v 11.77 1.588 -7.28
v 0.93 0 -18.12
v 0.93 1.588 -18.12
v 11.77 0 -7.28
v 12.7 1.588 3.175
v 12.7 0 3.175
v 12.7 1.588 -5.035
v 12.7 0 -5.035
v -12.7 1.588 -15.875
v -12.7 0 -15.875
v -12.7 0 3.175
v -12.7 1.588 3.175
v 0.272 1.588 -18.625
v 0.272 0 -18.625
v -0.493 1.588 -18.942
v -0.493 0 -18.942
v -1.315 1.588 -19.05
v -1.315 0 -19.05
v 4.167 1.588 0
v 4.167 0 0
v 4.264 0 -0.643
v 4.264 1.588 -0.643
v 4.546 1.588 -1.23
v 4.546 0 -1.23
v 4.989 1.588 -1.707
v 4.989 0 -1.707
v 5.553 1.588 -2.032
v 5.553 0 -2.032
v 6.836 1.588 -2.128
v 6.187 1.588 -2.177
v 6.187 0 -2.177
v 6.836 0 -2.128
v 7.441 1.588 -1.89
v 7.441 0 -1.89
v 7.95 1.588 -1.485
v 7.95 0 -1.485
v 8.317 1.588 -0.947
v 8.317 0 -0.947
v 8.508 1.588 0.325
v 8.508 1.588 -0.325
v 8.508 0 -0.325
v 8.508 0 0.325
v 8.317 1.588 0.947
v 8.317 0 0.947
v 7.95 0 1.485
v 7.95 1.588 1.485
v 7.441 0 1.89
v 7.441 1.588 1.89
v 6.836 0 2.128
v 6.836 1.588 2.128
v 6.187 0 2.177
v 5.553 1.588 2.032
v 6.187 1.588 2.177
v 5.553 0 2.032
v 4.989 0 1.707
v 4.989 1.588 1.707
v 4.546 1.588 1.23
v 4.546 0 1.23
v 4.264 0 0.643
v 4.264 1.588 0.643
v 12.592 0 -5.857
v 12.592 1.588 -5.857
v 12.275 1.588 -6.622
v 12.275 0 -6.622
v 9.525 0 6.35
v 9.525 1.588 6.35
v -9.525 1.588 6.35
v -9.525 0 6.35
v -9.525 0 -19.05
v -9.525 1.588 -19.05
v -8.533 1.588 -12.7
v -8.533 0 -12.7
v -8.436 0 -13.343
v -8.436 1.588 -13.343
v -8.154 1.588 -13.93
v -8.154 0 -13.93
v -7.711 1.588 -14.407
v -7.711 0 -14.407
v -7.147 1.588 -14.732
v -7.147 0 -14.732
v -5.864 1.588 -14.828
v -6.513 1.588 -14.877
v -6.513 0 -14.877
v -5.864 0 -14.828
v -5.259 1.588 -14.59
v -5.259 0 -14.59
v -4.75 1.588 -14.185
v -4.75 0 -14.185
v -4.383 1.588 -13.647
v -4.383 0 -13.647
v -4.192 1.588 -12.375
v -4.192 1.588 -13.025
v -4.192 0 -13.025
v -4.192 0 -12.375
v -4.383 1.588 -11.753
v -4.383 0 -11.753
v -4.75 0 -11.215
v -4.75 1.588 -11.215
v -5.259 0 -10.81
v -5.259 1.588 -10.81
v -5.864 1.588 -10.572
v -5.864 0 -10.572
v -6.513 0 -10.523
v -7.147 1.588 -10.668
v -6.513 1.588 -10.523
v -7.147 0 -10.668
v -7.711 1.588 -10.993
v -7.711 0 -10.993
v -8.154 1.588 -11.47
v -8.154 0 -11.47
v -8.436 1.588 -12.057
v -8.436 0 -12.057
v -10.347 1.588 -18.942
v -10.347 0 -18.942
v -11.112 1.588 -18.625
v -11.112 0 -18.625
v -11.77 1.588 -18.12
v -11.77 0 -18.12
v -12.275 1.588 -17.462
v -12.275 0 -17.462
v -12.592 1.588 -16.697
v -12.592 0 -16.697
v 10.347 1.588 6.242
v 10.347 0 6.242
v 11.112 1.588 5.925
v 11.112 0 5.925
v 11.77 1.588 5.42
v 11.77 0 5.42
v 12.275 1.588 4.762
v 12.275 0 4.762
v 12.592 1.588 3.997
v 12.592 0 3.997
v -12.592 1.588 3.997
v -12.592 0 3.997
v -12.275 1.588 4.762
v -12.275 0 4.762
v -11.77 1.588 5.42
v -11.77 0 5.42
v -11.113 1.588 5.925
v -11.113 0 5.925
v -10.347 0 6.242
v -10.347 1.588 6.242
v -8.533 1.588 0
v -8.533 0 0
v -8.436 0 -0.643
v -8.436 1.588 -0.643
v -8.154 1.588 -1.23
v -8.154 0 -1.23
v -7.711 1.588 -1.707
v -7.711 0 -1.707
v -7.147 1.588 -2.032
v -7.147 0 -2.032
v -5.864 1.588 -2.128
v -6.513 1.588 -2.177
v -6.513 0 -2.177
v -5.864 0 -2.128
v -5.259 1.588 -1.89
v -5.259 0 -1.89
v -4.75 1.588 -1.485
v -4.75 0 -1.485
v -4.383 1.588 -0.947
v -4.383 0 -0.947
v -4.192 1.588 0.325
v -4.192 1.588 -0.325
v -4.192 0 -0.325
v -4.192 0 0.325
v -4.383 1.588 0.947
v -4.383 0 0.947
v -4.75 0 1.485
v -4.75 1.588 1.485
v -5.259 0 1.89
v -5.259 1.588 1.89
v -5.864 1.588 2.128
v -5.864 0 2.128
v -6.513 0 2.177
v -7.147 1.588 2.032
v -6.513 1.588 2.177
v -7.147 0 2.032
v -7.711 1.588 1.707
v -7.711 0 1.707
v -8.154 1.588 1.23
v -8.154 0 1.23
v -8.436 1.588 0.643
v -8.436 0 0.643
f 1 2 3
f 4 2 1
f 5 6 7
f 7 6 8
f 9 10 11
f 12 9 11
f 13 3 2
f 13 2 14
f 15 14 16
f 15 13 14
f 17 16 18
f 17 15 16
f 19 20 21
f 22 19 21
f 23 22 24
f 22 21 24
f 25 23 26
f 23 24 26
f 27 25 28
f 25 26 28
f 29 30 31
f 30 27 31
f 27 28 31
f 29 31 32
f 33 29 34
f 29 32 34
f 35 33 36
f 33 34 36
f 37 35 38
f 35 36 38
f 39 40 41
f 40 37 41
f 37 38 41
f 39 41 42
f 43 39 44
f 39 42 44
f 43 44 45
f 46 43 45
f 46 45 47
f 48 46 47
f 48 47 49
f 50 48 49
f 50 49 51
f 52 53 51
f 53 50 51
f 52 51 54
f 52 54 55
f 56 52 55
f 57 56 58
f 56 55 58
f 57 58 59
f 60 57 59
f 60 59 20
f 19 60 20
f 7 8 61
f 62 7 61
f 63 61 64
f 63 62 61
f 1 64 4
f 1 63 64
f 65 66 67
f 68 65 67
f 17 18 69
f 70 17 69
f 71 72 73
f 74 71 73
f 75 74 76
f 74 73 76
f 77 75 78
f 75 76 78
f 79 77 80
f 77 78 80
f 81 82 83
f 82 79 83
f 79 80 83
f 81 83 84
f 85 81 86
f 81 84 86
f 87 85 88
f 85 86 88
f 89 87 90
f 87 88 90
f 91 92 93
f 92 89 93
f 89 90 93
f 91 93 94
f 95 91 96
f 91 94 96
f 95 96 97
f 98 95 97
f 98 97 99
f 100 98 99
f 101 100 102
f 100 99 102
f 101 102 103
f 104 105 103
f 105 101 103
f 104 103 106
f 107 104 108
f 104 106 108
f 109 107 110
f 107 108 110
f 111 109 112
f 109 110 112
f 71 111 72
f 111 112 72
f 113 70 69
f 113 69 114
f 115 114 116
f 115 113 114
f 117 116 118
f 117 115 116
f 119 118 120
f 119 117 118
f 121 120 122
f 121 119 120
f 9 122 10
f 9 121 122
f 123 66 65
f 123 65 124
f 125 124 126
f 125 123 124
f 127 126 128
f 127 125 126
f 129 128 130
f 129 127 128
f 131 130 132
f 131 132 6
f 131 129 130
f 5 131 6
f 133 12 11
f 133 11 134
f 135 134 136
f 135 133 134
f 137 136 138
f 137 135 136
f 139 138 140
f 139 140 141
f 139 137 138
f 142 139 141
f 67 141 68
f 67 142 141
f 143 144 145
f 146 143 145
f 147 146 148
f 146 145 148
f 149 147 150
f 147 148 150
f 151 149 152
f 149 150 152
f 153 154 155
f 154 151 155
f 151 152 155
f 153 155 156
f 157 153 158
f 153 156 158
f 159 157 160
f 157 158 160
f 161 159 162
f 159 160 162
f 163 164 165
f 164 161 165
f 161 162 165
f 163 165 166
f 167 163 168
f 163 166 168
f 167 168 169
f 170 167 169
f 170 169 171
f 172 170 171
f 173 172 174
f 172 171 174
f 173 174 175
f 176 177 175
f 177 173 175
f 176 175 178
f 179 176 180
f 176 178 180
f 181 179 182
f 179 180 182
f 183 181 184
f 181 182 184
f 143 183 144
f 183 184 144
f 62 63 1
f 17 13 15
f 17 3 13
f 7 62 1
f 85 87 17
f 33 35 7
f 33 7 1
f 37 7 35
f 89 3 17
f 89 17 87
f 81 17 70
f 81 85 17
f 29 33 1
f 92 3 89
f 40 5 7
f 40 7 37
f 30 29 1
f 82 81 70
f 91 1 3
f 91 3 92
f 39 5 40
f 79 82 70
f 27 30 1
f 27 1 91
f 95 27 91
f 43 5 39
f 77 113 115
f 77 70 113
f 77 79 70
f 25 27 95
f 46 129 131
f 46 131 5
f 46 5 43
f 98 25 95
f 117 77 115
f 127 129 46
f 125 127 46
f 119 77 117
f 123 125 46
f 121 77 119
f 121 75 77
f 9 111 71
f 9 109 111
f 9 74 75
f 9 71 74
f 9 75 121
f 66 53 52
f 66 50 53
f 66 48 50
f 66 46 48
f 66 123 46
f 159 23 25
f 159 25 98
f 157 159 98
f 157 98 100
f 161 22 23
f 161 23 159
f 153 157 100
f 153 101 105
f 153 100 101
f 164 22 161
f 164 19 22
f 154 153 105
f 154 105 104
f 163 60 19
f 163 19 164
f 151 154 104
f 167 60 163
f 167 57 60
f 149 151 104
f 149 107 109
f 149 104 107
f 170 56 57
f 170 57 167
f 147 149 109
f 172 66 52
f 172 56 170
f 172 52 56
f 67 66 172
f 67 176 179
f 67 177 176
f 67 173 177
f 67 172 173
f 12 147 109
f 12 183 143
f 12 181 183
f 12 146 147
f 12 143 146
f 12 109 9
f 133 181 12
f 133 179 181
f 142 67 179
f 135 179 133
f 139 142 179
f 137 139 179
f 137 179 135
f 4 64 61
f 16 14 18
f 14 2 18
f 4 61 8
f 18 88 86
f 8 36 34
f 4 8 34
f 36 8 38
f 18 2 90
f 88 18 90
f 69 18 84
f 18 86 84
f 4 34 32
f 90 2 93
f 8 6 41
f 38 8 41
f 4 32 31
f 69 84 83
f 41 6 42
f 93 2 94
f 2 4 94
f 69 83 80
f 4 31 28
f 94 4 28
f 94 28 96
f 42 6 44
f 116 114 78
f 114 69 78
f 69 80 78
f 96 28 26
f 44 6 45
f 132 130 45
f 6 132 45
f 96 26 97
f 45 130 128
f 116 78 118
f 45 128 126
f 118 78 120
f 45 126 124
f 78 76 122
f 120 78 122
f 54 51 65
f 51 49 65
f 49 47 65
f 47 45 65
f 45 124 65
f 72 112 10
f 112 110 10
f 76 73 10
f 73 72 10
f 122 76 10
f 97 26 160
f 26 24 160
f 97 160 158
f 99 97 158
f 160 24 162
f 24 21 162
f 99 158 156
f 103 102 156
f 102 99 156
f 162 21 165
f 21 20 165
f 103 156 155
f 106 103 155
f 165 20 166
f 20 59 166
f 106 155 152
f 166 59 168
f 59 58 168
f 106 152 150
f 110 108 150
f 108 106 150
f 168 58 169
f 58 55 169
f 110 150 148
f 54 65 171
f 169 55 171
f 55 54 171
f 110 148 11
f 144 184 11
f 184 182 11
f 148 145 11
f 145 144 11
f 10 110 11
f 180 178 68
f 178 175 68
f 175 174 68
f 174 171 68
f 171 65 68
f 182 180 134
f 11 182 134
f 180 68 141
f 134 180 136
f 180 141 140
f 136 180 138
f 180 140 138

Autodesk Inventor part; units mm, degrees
ref_plane "YZ Plane" through (0, 0, 0) normal (1, 0, 0) x (0, 1, 0)
ref_plane "XZ Plane" through (0, 0, 0) normal (0, 1, 0) x (-1, 0, 0)
ref_plane "XY Plane" through (0, 0, 0) normal (0, 0, 1) x (1, 0, 0)
sketch "Sketch1" plane through (0, 0, 0) normal (0, 1, 0) x (-1, 0, 0)
  line L0 (-12.7, -19.05) -> (12.7, -19.05)
  line L1 (12.7, -19.05) -> (12.7, 19.05)
  line L2 (12.7, 19.05) -> (-12.7, 19.05)
  line L3 (-12.7, 19.05) -> (-12.7, -19.05)
  line L4 (-12.7, -19.05) -> (12.7, 19.05) construction
  line L5 (12.7, -19.05) -> (-12.7, 19.05) construction
  line L6 (12.7, 19.05) -> (0, 19.05)
  line L7 (0, 19.05) -> (0, -19.05)
  line L8 (0, -19.05) -> (12.7, -19.05)
  line L9 (12.7, -19.05) -> (12.7, 19.05)
  line L10 (0, 19.05) -> (-12.7, 6.35)
  line L11 (0, 19.05) -> (17.9605, 19.05) construction
  line L12 (0, -19.05) -> (-12.7, -6.35)
  line L13 (0, -19.05) -> (17.9605, -19.05) construction
  circle A0 centre (6.35, 0) radius 2.1828
  circle A1 centre (-6.35, 0) radius 2.1828
  circle A2 centre (6.35, 12.7) radius 2.1828
  circle A3 centre (6.35, -12.7) radius 2.1828
  point P0 (0, 0)
  point P1 (0, 0)
  point P2 (8.9803, -19.05)
  dimension "d0" = 25.4
  dimension "d1" = 38.1
  dimension "d2" = 135
  dimension "d3" = 135
  dimension "d4" = 4.3656
  dimension "d5" = 4.3656
  dimension "d6" = 4.3656
  dimension "d7" = 4.3656
  dimension "d10" = 12.7
  dimension "d11" = 6.35
  dimension "d12" = 19.05
  dimension "d13" = 19.05
extrude "Extrusion1" add sketch "Sketch1" along normal blind 1.5875 contours L7 L2 L1 L0 | L12 L3 L10 L7
sketch "Sketch2" plane through (0, 1.5875, 0) normal (0, 1, 0) x (1, 0, 0)
  line L0 (12.7, -6.35) -> (12.7, 6.35) projected
  line L1 (12.7, -6.35) -> (-18.9593, -6.35)
  line L2 (-18.9593, -6.35) -> (-18.9593, -20.186)
  line L3 (-18.9593, -20.186) -> (12.7, -20.186)
  line L4 (12.7, -20.186) -> (12.7, -6.35)
  point P0 (0, 0)
extrude "Extrusion2" cut sketch "Sketch2" against normal blind 25.4
fillet "Fillet1" radius 3.175 5 edges at (12.7, 0.7937, 6.35) (-12.7, 0.7937, 6.35) (12.7, 0.7937, -6.35) (0, 0.7937, -19.05) (-12.7, 0.7937, -19.05)
properties part number "bracket1"
